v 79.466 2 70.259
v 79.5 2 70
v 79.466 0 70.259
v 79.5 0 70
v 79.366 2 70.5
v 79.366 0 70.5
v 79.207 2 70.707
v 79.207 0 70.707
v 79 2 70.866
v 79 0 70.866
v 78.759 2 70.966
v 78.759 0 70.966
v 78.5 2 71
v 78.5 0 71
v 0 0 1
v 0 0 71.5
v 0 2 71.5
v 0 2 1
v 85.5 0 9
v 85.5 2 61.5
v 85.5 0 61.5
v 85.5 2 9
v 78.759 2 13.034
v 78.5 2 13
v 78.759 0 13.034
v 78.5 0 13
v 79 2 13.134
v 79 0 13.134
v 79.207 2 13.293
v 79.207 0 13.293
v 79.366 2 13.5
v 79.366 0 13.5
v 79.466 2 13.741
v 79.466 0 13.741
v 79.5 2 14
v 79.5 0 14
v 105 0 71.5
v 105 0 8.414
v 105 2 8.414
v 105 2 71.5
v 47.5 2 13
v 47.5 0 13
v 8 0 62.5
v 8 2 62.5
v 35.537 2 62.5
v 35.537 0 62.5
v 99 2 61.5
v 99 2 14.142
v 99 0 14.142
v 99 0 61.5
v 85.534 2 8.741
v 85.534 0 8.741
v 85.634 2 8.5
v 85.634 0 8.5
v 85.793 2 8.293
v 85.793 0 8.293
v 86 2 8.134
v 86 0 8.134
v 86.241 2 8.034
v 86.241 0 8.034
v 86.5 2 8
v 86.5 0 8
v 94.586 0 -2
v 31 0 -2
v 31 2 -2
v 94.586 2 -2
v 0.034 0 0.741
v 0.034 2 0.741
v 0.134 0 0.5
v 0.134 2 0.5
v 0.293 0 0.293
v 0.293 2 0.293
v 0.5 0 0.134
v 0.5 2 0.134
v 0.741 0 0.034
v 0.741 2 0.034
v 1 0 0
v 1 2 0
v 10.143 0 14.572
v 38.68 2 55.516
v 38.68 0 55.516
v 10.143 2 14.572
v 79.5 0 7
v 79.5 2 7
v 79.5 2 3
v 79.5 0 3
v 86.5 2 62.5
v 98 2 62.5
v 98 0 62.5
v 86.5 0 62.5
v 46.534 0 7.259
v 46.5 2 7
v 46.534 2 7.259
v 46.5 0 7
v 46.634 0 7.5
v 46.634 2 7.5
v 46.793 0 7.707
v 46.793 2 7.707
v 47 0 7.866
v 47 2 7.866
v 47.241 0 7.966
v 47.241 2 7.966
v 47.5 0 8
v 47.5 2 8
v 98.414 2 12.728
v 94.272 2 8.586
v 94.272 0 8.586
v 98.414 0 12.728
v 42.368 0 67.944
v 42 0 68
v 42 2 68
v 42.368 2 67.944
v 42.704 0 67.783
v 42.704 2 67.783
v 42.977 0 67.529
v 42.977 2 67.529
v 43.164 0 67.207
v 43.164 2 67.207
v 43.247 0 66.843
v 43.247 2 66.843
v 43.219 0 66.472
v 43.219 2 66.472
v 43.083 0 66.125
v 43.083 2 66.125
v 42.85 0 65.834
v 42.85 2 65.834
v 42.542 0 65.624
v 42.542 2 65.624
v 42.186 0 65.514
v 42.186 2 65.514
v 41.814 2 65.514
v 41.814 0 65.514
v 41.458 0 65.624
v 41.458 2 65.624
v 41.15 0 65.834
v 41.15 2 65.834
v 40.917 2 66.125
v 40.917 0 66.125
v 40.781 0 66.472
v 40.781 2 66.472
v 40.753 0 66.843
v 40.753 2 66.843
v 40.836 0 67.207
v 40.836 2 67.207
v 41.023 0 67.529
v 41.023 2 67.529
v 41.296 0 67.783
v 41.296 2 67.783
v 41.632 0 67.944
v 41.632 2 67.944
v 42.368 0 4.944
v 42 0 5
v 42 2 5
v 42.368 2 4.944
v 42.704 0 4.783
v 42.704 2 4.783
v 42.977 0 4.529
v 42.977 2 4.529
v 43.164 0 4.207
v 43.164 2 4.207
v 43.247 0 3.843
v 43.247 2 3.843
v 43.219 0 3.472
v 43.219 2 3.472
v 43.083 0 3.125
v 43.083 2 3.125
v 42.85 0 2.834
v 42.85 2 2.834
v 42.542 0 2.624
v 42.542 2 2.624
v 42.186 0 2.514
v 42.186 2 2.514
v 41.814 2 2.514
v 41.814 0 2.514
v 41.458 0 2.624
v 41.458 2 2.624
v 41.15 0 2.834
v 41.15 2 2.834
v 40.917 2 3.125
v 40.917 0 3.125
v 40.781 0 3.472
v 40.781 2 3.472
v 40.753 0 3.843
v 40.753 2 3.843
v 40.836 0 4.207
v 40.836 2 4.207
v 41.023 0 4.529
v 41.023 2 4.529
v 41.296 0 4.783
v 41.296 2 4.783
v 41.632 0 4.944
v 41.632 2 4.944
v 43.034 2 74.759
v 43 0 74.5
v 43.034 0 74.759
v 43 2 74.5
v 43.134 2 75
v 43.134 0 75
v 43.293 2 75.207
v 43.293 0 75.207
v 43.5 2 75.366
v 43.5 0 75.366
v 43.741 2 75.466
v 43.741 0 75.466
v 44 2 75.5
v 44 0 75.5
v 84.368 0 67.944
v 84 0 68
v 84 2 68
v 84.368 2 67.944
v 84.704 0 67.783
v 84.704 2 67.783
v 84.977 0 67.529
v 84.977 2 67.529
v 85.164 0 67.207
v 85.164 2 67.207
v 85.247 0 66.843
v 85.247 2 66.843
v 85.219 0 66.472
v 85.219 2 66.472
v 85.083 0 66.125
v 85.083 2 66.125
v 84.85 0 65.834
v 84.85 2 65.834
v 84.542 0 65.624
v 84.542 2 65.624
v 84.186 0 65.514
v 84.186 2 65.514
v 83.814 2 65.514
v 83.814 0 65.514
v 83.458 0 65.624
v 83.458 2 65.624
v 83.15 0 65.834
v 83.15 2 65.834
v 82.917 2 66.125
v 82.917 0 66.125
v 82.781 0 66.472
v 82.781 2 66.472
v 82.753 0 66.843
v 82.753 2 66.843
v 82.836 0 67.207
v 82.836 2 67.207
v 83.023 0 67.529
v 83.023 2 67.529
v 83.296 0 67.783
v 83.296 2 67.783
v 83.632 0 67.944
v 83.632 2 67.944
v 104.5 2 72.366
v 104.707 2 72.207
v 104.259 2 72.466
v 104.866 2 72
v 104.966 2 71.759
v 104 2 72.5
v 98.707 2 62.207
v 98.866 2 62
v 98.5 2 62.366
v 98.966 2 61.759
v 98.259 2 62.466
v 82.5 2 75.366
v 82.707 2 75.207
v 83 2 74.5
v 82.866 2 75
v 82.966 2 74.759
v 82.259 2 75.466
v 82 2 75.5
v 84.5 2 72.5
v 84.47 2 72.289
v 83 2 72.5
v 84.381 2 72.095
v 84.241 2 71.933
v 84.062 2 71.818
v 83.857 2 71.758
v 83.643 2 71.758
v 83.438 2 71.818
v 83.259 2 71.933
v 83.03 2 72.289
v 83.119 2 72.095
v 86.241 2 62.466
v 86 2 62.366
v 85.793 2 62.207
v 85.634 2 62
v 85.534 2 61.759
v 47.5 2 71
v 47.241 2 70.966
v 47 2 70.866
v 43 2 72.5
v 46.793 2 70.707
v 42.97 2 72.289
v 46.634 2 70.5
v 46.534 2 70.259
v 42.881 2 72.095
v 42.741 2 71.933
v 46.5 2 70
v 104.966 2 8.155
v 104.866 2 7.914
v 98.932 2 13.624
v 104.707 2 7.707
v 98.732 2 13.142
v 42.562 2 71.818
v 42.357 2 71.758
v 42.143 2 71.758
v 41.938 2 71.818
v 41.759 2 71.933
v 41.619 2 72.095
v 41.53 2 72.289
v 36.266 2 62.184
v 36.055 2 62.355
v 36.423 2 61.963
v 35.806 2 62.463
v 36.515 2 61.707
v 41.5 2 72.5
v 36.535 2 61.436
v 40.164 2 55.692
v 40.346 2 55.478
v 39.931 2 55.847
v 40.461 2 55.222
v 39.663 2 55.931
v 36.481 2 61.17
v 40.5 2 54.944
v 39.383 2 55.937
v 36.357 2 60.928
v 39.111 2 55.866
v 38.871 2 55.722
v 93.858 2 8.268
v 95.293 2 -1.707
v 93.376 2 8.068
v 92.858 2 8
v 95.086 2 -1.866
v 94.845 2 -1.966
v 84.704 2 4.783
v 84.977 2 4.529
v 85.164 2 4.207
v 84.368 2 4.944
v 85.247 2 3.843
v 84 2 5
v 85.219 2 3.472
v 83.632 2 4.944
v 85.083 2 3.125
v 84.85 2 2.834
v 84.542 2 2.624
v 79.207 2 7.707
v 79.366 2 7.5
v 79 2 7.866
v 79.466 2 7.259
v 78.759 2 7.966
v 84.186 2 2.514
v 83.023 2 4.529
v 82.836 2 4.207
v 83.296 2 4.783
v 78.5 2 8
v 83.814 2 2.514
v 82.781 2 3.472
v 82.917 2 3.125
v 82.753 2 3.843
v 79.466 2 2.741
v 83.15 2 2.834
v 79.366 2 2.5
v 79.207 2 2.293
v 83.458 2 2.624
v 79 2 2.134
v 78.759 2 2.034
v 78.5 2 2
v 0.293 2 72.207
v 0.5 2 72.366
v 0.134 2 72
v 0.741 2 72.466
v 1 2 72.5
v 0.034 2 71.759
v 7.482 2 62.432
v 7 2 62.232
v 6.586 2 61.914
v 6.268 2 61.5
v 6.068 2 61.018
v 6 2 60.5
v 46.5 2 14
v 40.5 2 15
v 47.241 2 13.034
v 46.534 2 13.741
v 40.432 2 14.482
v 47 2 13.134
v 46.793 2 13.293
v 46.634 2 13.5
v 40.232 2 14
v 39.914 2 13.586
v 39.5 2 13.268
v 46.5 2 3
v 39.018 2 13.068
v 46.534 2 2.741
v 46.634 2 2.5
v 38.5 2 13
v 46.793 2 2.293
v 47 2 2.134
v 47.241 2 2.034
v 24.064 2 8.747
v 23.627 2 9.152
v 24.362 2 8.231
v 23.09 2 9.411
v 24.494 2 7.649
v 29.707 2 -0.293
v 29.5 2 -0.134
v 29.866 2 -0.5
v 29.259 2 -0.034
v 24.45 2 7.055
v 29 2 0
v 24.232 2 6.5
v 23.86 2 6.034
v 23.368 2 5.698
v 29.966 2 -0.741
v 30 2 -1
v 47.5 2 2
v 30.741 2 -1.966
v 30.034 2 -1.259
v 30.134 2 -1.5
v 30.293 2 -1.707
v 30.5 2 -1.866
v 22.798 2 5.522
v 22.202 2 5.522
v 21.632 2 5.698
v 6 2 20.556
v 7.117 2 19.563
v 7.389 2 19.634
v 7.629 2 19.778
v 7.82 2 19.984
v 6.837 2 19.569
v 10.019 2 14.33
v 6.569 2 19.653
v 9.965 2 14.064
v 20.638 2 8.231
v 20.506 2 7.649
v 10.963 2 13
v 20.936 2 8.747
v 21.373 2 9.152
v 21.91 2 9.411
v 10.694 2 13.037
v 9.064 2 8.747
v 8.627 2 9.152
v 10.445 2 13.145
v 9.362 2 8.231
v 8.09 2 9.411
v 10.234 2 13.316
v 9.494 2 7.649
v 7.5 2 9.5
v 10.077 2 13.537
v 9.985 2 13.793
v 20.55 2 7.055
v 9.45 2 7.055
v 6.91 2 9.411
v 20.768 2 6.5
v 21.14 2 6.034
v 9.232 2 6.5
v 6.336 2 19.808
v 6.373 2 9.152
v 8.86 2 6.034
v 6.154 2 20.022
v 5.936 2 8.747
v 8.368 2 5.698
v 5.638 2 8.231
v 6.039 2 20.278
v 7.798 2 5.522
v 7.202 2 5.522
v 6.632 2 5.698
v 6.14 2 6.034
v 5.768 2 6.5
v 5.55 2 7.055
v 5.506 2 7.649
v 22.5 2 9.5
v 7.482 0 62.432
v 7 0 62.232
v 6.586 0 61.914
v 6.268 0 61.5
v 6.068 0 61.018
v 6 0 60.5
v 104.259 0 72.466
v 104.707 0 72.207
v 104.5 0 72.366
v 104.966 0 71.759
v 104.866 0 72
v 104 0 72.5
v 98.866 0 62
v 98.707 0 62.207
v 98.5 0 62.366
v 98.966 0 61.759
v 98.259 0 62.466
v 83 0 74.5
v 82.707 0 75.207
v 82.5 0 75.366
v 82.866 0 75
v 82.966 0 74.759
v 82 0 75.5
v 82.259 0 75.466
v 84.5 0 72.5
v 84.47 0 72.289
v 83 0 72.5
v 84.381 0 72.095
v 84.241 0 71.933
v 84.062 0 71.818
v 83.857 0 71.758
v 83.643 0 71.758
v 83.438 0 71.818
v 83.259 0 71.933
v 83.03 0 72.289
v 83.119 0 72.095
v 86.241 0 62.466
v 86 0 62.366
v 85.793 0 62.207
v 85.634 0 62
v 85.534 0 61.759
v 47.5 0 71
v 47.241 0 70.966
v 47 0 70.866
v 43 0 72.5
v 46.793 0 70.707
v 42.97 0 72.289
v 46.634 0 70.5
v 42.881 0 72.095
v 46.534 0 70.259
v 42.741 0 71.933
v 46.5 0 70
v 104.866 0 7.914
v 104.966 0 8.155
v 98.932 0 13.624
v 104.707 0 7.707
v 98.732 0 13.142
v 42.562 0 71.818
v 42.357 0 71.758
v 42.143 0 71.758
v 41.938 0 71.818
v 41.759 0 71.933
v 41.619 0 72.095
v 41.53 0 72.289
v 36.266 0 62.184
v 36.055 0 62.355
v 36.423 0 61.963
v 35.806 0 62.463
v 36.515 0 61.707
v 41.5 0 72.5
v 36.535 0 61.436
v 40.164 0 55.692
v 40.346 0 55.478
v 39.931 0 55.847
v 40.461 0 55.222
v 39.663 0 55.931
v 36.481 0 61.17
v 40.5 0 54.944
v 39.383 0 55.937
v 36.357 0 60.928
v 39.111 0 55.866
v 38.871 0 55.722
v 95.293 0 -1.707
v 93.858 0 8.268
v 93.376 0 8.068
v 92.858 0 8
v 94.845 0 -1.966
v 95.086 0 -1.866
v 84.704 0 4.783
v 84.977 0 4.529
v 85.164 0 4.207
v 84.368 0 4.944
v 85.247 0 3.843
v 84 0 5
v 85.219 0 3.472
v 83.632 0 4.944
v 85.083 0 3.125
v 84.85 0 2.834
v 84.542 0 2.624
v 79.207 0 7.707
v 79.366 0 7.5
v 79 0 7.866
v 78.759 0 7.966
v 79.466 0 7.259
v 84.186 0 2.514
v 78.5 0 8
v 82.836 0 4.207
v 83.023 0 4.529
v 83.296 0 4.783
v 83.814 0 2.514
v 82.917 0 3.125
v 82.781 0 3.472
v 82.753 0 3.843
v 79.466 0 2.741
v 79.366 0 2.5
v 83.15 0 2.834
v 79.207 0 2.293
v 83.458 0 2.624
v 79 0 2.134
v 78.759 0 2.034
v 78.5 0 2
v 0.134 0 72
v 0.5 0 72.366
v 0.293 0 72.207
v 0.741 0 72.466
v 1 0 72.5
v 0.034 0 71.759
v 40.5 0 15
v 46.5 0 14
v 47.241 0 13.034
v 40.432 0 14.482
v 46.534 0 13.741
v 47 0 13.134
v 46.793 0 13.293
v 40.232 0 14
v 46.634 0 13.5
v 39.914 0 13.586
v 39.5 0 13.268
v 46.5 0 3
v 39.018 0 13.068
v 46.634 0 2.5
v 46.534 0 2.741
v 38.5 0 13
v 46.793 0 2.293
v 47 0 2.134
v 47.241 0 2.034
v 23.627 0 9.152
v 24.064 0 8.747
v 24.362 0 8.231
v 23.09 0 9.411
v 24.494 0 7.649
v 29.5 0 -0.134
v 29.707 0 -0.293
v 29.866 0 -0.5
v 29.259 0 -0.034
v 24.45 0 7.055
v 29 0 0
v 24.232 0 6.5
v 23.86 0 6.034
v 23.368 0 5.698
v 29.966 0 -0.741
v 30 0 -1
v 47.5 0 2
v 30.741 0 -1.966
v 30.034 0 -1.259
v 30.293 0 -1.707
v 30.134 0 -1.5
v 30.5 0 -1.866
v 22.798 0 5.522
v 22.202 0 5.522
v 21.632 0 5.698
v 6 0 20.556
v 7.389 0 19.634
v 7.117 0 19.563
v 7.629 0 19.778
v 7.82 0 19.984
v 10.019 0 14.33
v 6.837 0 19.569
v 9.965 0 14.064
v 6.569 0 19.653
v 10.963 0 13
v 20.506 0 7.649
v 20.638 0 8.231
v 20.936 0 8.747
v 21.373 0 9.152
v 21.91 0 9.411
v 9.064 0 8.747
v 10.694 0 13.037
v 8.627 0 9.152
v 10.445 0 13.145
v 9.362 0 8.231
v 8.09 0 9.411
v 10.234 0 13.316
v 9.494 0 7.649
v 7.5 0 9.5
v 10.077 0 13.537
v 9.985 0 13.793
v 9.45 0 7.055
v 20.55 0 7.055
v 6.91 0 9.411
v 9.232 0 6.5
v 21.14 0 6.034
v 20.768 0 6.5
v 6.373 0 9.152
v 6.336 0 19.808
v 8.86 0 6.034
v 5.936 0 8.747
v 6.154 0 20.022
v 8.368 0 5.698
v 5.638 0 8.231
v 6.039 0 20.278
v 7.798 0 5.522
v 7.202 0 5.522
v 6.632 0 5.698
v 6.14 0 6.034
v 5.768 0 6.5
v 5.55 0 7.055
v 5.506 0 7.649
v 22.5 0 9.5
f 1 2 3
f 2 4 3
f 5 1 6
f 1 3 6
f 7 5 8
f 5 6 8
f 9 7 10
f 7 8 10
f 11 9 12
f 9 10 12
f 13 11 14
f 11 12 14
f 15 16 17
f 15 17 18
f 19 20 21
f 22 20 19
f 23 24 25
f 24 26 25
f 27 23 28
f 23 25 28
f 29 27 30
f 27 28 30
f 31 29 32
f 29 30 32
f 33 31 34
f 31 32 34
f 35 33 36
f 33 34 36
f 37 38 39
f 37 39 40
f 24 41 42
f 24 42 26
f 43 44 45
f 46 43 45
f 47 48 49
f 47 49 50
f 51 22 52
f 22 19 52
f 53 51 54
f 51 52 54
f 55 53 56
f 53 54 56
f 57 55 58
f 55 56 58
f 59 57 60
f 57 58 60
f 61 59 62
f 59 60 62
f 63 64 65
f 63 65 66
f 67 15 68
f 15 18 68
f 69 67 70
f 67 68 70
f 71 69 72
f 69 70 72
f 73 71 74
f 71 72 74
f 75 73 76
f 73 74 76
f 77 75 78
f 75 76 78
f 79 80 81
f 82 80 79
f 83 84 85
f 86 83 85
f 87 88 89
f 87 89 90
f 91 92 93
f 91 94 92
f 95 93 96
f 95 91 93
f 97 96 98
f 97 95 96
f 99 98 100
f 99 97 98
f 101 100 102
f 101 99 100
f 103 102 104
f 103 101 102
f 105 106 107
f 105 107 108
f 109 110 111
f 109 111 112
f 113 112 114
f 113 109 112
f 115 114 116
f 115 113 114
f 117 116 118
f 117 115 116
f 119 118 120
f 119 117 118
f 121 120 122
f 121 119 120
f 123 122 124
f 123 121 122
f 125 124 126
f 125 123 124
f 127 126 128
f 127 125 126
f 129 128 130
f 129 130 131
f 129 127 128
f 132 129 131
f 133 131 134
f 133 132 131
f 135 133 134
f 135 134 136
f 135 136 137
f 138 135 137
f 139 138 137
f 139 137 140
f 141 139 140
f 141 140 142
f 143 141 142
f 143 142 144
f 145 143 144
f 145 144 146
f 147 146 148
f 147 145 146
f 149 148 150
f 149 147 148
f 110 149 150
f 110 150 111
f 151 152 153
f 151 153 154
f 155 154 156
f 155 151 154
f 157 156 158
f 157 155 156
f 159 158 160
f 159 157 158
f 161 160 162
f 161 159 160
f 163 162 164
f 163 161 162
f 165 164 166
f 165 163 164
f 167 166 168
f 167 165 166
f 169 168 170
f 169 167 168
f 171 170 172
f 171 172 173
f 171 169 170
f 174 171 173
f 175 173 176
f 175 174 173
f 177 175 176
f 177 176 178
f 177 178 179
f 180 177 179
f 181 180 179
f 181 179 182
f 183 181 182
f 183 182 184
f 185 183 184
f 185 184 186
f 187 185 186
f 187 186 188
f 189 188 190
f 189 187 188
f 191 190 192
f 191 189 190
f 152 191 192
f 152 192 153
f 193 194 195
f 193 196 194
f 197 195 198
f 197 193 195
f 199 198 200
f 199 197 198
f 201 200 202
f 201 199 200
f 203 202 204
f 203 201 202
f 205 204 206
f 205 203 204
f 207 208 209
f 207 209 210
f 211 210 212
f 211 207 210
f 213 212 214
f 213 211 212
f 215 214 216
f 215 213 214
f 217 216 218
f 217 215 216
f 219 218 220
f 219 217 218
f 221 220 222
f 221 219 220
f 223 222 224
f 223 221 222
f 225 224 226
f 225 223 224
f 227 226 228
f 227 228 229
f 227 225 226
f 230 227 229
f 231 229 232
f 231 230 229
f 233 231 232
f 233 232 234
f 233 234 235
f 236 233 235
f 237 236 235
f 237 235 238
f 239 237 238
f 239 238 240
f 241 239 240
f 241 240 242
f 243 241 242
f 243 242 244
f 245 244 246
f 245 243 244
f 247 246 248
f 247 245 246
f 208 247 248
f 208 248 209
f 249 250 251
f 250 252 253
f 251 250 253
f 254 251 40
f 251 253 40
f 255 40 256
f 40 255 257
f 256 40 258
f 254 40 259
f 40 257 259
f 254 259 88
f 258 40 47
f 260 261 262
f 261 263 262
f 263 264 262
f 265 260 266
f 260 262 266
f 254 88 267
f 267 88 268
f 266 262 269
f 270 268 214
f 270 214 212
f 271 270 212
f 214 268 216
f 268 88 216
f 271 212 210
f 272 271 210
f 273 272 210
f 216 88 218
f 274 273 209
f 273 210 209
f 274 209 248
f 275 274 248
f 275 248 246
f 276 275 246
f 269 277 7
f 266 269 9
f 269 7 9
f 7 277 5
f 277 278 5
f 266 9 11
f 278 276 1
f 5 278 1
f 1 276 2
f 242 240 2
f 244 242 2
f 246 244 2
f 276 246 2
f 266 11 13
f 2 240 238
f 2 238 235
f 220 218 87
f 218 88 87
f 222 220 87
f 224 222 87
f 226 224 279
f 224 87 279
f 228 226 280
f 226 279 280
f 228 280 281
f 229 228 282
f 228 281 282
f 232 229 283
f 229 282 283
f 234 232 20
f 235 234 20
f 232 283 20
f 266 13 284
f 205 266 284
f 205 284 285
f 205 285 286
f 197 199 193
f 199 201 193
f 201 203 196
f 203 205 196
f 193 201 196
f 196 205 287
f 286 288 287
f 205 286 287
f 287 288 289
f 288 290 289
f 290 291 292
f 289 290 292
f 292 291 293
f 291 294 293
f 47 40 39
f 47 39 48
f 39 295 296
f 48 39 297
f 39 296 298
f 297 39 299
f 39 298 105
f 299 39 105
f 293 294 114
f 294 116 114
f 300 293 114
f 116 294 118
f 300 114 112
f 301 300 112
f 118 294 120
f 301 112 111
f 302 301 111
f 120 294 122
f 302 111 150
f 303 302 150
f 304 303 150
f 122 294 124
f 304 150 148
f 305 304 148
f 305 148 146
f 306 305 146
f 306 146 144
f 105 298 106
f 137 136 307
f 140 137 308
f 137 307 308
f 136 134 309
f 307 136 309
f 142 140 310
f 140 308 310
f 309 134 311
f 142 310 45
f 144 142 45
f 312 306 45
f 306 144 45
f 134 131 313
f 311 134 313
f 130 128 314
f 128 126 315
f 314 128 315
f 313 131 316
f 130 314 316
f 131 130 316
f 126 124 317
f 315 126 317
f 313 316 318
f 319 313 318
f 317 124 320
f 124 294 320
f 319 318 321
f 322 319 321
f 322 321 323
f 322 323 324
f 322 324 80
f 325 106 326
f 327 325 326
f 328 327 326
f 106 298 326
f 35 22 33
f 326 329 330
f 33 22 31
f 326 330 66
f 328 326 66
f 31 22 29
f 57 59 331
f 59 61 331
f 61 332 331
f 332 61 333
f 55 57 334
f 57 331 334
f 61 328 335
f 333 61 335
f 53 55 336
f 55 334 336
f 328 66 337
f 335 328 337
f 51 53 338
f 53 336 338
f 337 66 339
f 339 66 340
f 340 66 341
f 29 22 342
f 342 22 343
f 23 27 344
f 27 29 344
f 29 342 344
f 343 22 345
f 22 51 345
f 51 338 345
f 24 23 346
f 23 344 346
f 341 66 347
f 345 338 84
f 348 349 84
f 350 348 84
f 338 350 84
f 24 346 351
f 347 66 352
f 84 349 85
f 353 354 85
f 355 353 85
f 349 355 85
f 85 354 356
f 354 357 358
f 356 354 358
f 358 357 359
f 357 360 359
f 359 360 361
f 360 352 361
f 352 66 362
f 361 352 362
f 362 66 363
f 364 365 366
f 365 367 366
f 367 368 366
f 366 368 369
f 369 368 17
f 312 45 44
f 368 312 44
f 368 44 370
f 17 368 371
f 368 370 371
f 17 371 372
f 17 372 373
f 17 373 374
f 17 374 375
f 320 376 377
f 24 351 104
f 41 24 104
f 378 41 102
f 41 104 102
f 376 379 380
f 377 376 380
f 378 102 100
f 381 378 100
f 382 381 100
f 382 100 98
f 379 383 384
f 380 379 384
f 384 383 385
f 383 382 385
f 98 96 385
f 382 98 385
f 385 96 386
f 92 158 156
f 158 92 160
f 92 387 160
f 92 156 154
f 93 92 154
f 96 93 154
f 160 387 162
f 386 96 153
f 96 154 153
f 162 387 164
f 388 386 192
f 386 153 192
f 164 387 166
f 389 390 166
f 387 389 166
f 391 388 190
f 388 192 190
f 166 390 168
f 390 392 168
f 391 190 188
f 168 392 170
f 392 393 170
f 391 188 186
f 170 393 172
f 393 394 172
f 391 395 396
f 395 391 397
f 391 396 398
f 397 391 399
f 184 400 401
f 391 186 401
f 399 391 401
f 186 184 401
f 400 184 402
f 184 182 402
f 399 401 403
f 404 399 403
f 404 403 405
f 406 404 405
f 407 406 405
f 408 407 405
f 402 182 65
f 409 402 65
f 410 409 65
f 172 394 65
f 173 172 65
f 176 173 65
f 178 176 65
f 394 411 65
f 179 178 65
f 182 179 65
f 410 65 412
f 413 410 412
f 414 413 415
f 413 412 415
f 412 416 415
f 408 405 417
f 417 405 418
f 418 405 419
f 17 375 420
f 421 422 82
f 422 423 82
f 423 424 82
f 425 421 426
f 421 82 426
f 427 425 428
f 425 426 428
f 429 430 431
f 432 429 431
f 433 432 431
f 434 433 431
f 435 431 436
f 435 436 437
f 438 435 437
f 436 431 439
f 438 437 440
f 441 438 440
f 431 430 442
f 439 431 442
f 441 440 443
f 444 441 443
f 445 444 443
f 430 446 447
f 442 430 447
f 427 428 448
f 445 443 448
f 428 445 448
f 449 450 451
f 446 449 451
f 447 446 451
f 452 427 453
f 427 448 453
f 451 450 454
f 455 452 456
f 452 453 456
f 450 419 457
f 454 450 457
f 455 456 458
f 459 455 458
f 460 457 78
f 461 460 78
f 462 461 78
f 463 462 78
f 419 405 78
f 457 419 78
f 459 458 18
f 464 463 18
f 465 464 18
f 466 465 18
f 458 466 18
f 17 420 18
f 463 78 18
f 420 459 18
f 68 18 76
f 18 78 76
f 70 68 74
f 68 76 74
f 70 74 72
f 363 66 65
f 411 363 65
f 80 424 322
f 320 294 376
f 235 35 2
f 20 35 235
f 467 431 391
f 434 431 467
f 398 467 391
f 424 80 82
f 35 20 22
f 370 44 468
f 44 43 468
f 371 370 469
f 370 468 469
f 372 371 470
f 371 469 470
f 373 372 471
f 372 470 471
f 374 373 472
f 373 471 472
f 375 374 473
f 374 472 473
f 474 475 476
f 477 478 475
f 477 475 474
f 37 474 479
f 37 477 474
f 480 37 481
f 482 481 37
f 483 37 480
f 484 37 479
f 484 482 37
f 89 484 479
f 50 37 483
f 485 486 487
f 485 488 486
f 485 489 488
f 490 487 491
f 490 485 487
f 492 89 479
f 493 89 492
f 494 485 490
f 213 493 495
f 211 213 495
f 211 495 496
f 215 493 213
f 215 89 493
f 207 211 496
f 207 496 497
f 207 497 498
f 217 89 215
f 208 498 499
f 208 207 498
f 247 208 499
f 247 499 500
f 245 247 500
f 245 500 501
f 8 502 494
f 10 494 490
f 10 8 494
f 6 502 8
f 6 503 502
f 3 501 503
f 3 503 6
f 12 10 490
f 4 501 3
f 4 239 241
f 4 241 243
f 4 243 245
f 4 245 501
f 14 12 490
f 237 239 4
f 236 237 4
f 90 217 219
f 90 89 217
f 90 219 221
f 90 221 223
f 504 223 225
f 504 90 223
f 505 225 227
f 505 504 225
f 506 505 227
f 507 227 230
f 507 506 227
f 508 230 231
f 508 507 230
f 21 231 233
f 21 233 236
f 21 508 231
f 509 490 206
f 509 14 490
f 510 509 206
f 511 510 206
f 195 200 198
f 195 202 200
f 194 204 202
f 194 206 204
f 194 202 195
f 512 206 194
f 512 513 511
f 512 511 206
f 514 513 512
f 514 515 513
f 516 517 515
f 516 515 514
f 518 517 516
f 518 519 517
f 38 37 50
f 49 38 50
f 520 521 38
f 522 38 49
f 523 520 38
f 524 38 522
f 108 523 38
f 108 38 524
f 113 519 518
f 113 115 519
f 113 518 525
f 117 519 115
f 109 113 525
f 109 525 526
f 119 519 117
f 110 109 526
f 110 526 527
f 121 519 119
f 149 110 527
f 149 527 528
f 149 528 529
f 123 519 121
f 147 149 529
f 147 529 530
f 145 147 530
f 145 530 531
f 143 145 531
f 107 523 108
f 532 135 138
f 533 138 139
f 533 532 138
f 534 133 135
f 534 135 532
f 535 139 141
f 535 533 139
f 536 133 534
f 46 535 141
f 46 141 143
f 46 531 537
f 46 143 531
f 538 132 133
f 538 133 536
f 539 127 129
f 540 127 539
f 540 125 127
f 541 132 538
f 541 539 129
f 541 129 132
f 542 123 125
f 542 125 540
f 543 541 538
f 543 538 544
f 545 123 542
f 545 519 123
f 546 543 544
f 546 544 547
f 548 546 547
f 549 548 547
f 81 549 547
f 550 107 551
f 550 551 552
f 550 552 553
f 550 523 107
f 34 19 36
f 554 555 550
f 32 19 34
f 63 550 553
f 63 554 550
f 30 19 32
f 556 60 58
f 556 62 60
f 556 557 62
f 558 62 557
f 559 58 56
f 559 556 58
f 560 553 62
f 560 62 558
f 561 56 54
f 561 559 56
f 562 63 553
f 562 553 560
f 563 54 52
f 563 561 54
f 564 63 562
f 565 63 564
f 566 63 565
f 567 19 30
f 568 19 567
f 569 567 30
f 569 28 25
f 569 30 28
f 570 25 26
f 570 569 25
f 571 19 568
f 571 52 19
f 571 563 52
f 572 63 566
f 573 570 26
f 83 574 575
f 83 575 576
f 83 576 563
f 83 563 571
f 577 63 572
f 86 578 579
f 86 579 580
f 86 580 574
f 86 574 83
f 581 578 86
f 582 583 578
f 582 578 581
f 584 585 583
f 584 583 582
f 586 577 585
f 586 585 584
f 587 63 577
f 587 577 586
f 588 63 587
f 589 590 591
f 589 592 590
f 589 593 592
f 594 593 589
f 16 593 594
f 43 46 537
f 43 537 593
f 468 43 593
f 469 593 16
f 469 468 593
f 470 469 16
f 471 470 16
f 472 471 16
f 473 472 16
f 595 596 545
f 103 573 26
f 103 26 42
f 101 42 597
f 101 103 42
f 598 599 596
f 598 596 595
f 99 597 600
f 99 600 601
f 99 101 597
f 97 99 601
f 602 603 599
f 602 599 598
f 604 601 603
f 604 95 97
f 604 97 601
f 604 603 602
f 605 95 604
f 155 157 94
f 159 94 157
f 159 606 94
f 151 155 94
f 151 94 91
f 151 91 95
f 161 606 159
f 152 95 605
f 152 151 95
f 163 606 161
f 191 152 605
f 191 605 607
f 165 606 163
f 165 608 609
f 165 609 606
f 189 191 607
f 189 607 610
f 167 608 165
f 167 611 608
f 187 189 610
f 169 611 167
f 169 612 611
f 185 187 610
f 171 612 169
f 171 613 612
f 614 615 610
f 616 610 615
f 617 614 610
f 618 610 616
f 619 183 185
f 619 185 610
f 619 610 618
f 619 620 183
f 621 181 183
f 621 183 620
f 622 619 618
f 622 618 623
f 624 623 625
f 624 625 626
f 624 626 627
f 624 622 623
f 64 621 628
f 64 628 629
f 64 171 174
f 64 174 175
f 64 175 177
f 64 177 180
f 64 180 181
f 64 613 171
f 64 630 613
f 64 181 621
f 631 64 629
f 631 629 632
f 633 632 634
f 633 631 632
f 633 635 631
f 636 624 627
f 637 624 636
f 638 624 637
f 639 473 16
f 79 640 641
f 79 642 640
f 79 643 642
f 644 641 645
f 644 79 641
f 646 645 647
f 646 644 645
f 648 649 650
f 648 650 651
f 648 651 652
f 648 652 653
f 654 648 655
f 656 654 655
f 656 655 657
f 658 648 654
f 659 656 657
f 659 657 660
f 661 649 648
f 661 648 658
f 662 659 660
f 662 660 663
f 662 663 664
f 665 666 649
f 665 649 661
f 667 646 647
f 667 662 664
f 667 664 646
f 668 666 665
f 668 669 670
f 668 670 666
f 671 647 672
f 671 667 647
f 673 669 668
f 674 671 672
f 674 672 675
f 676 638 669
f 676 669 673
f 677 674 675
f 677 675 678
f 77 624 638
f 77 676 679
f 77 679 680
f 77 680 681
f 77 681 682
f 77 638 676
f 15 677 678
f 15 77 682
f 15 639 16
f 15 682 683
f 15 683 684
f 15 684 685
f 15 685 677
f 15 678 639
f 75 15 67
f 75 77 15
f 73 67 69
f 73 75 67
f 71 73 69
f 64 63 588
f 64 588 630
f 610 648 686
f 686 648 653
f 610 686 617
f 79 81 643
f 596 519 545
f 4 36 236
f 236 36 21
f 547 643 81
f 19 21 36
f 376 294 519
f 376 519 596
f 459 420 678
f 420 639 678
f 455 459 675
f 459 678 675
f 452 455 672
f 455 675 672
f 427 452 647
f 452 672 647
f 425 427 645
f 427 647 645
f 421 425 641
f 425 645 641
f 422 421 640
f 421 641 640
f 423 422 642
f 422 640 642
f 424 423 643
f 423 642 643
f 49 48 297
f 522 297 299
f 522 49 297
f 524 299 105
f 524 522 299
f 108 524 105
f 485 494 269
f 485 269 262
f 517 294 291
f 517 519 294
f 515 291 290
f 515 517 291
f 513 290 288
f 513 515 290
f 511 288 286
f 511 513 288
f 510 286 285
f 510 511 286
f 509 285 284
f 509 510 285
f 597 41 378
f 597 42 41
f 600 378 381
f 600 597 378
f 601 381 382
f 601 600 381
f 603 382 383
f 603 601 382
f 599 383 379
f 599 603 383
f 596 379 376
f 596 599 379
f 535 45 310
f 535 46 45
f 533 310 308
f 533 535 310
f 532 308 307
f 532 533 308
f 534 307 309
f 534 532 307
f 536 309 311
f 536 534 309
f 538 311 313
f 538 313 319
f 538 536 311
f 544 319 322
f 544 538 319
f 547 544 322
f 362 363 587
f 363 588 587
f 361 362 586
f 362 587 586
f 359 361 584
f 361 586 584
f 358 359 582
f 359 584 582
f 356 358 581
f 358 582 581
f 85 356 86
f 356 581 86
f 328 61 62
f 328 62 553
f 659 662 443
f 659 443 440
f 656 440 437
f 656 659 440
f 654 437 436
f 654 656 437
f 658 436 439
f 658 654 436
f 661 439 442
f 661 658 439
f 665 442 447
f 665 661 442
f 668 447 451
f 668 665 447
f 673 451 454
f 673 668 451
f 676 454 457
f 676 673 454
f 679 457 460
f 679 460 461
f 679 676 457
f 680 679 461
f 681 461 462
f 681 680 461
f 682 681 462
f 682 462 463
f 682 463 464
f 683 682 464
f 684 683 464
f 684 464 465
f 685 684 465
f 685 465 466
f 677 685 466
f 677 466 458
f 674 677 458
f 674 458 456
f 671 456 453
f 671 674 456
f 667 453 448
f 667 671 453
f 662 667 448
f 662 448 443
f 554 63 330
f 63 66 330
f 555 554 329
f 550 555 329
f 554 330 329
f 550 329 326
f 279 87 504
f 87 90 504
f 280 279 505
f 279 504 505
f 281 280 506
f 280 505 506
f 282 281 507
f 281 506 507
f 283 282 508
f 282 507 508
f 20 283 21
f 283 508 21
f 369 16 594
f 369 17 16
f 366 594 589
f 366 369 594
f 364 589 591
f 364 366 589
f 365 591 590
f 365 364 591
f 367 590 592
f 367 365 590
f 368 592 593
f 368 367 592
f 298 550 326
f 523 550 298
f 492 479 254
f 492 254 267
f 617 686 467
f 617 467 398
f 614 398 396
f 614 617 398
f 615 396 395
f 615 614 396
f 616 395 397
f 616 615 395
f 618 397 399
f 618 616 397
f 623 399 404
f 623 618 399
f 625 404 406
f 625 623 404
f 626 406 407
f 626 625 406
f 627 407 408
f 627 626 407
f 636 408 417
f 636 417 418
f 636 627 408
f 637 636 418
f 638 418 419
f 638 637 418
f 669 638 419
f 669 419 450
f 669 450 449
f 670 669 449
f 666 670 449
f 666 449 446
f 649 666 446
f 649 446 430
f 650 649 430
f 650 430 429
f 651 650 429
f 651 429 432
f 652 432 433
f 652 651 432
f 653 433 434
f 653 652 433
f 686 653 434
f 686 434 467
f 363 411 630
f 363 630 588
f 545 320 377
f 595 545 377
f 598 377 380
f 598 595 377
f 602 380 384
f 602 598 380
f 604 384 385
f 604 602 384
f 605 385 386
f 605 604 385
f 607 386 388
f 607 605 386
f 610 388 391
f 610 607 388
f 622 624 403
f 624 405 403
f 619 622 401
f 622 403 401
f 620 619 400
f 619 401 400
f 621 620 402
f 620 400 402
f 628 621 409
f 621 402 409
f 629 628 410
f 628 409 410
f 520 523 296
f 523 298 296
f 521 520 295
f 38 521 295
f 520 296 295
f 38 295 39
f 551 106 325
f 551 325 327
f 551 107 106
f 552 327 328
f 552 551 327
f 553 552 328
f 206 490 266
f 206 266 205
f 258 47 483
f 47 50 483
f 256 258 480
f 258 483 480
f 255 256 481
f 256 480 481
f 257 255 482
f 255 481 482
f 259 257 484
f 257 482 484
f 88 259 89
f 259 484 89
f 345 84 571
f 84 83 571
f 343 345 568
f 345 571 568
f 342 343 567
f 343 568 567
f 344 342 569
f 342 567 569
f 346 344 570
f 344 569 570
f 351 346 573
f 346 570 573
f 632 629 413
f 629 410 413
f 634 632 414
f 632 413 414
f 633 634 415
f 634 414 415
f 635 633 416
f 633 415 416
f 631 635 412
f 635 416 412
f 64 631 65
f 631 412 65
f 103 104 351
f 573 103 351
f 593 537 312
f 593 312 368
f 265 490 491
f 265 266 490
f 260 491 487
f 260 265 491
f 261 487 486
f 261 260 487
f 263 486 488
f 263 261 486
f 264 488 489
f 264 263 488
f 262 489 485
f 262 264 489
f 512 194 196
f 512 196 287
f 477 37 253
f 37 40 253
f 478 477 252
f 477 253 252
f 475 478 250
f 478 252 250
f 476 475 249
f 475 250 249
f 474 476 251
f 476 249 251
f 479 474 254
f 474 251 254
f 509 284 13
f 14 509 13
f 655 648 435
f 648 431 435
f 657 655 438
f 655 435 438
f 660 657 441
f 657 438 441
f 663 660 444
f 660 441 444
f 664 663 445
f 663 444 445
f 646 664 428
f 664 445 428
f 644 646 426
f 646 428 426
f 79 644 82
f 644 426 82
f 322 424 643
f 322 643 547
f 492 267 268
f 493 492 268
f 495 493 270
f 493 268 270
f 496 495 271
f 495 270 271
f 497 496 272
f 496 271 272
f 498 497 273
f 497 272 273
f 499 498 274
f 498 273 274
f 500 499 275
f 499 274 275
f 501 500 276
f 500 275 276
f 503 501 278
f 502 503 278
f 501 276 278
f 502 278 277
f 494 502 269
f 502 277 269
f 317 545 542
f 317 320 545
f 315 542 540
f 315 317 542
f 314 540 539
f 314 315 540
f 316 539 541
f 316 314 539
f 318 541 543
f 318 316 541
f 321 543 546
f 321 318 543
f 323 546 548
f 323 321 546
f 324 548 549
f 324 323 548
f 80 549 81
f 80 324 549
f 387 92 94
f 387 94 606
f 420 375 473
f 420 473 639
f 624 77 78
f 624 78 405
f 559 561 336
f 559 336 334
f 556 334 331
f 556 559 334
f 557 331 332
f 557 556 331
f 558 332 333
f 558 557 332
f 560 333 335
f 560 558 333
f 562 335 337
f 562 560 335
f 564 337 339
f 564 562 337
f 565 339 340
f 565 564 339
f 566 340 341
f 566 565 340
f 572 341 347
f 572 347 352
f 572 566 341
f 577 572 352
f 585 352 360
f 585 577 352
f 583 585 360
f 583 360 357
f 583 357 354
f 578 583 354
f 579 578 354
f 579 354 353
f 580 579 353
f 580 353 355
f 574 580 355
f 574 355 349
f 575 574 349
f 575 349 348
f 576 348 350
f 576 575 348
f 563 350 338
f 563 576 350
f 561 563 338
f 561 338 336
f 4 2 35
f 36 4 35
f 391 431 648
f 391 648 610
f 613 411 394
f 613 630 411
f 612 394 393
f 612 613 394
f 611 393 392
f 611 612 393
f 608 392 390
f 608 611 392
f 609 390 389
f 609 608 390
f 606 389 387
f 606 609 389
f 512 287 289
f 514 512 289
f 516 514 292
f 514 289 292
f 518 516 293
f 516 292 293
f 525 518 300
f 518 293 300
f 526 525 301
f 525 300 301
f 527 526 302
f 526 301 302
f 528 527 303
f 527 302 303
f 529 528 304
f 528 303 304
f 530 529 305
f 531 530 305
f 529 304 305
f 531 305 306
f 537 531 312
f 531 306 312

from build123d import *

# Parameters (mm, degrees)
SKETCH_1_R          = 2
SKETCH_1_R_2        = 1.25
EXTRUDE_1_DEPTH     = 2
SKETCH_3_W          = 33
SKETCH_3_H          = 6
SKETCH_3_H_2        = 58
SKETCH_3_W_2        = 34.5
SKETCH_3_H_3        = 49.5
CUT_EXTRUDE_2_DEPTH = 130.341601969
SKETCH_2_R          = 0.75
CUT_EXTRUDE_1_DEPTH = 130.341601969
EXTRUDE_1_2_DEPTH   = 2
FILLET_1_R          = 1
FILLET_2_R          = 2


with BuildPart() as part:
    # 草图1 → Extrude 1 (new body)
    with BuildSketch(Plane(origin=(0, 0, 0), x_dir=(1, 0, 0), z_dir=(0, 1, 0))):
        Polygon((0, 0), (30, 0), (30, 2), (95, 2), (105, -8), (105, -72.5), (83, -72.5), (83, -75.5), (43, -75.5), (43, -72.5), (0, -72.5), align=None)
        with Locations(Location((7.5, -7.5, 0), (0, 0, 270))):
            Circle(SKETCH_1_R, mode=Mode.SUBTRACT)
        with Locations(Location((22.5, -7.5, 0), (0, 0, 270))):
            Circle(SKETCH_1_R, mode=Mode.SUBTRACT)
        with Locations(Location((42, -3.75, 0), (0, 0, 270))):
            Circle(SKETCH_1_R_2, mode=Mode.SUBTRACT)
        with Locations(Location((42, -66.75, 0), (0, 0, 270))):
            Circle(SKETCH_1_R_2, mode=Mode.SUBTRACT)
        with Locations(Location((84, -66.75, 0), (0, 0, 270))):
            Circle(SKETCH_1_R_2, mode=Mode.SUBTRACT)
        with Locations(Location((84, -3.75, 0), (0, 0, 270))):
            Circle(SKETCH_1_R_2, mode=Mode.SUBTRACT)
    extrude(amount=EXTRUDE_1_DEPTH)

    # 草图3 → 切除-拉伸2 (cut, through all)
    with BuildSketch(Plane(origin=(0, 2, 0), x_dir=(1, 0, 0), z_dir=(0, 1, 0))):
        with Locations((63, -5)):
            Rectangle(SKETCH_3_W, SKETCH_3_H)
        with Locations((63, -42)):
            Rectangle(SKETCH_3_W, SKETCH_3_H_2)
        with Locations((23.25, -37.75)):
            Rectangle(SKETCH_3_W_2, SKETCH_3_H_3)
        Polygon((93.686291501, -8), (99, -13.313708499), (99, -62.5), (85.5, -62.5), (85.5, -8), align=None)
    extrude(amount=-CUT_EXTRUDE_2_DEPTH, mode=Mode.SUBTRACT)

    # 草图2 → 切除-拉伸1 (cut, through all)
    with BuildSketch(Plane(origin=(0, 2, 0), x_dir=(1, 0, 0), z_dir=(0, 1, 0))):
        with Locations((42.25, -72.5)):
            Circle(SKETCH_2_R)
        with Locations((83.75, -72.5)):
            Circle(SKETCH_2_R)
    extrude(amount=-CUT_EXTRUDE_1_DEPTH, mode=Mode.SUBTRACT)

    # 草图4 → Extrude 1 2 (add)
    with BuildSketch(Plane(origin=(0, 2, 0), x_dir=(1, 0, 0), z_dir=(0, 1, 0))):
        Polygon((3.949004583, -14.429481654), (38.449004583, -63.929481654), (42.550995417, -61.070518346), (8.050995417, -11.570518346), align=None)
    extrude(amount=-EXTRUDE_1_2_DEPTH)

    # 圆角1
    fillet_1_edges = [part.edges().sort_by_distance(p)[0] for p in [
        (0, 1, 0),
        (83, 1, 75.5),
        (0, 1, 72.5),
        (43, 1, 75.5),
        (105, 1, 72.5),
        (30, 1, -2),
        (30, 1, 0),
        (105, 1, 8),
        (95, 1, -2),
        (46.5, 1, 71),
        (46.5, 1, 13),
        (79.5, 1, 13),
        (79.5, 1, 71),
        (46.5, 1, 8),
        (46.5, 1, 2),
        (79.5, 1, 2),
        (79.5, 1, 8),
        (99, 1, 62.5),
        (85.5, 1, 62.5),
        (85.5, 1, 8),
        (37.452699188, 1, 62.5),
        (40.5, 1, 58.127785791),
        (6, 1, 17.372214209),
        (9.047300812, 1, 13),
    ]]
    fillet(fillet_1_edges, radius=FILLET_1_R - 0.0001)  # a hair under: the kernel refuses the full size

    # 圆角2
    fillet_2_edges = [part.edges().sort_by_distance(p)[0] for p in [
        (93.686291501, 1, 8),
        (99, 1, 13.313708499),
        (6, 1, 62.5),
        (40.5, 1, 13),
    ]]
    fillet(fillet_2_edges, radius=FILLET_2_R)


solid = part.part
